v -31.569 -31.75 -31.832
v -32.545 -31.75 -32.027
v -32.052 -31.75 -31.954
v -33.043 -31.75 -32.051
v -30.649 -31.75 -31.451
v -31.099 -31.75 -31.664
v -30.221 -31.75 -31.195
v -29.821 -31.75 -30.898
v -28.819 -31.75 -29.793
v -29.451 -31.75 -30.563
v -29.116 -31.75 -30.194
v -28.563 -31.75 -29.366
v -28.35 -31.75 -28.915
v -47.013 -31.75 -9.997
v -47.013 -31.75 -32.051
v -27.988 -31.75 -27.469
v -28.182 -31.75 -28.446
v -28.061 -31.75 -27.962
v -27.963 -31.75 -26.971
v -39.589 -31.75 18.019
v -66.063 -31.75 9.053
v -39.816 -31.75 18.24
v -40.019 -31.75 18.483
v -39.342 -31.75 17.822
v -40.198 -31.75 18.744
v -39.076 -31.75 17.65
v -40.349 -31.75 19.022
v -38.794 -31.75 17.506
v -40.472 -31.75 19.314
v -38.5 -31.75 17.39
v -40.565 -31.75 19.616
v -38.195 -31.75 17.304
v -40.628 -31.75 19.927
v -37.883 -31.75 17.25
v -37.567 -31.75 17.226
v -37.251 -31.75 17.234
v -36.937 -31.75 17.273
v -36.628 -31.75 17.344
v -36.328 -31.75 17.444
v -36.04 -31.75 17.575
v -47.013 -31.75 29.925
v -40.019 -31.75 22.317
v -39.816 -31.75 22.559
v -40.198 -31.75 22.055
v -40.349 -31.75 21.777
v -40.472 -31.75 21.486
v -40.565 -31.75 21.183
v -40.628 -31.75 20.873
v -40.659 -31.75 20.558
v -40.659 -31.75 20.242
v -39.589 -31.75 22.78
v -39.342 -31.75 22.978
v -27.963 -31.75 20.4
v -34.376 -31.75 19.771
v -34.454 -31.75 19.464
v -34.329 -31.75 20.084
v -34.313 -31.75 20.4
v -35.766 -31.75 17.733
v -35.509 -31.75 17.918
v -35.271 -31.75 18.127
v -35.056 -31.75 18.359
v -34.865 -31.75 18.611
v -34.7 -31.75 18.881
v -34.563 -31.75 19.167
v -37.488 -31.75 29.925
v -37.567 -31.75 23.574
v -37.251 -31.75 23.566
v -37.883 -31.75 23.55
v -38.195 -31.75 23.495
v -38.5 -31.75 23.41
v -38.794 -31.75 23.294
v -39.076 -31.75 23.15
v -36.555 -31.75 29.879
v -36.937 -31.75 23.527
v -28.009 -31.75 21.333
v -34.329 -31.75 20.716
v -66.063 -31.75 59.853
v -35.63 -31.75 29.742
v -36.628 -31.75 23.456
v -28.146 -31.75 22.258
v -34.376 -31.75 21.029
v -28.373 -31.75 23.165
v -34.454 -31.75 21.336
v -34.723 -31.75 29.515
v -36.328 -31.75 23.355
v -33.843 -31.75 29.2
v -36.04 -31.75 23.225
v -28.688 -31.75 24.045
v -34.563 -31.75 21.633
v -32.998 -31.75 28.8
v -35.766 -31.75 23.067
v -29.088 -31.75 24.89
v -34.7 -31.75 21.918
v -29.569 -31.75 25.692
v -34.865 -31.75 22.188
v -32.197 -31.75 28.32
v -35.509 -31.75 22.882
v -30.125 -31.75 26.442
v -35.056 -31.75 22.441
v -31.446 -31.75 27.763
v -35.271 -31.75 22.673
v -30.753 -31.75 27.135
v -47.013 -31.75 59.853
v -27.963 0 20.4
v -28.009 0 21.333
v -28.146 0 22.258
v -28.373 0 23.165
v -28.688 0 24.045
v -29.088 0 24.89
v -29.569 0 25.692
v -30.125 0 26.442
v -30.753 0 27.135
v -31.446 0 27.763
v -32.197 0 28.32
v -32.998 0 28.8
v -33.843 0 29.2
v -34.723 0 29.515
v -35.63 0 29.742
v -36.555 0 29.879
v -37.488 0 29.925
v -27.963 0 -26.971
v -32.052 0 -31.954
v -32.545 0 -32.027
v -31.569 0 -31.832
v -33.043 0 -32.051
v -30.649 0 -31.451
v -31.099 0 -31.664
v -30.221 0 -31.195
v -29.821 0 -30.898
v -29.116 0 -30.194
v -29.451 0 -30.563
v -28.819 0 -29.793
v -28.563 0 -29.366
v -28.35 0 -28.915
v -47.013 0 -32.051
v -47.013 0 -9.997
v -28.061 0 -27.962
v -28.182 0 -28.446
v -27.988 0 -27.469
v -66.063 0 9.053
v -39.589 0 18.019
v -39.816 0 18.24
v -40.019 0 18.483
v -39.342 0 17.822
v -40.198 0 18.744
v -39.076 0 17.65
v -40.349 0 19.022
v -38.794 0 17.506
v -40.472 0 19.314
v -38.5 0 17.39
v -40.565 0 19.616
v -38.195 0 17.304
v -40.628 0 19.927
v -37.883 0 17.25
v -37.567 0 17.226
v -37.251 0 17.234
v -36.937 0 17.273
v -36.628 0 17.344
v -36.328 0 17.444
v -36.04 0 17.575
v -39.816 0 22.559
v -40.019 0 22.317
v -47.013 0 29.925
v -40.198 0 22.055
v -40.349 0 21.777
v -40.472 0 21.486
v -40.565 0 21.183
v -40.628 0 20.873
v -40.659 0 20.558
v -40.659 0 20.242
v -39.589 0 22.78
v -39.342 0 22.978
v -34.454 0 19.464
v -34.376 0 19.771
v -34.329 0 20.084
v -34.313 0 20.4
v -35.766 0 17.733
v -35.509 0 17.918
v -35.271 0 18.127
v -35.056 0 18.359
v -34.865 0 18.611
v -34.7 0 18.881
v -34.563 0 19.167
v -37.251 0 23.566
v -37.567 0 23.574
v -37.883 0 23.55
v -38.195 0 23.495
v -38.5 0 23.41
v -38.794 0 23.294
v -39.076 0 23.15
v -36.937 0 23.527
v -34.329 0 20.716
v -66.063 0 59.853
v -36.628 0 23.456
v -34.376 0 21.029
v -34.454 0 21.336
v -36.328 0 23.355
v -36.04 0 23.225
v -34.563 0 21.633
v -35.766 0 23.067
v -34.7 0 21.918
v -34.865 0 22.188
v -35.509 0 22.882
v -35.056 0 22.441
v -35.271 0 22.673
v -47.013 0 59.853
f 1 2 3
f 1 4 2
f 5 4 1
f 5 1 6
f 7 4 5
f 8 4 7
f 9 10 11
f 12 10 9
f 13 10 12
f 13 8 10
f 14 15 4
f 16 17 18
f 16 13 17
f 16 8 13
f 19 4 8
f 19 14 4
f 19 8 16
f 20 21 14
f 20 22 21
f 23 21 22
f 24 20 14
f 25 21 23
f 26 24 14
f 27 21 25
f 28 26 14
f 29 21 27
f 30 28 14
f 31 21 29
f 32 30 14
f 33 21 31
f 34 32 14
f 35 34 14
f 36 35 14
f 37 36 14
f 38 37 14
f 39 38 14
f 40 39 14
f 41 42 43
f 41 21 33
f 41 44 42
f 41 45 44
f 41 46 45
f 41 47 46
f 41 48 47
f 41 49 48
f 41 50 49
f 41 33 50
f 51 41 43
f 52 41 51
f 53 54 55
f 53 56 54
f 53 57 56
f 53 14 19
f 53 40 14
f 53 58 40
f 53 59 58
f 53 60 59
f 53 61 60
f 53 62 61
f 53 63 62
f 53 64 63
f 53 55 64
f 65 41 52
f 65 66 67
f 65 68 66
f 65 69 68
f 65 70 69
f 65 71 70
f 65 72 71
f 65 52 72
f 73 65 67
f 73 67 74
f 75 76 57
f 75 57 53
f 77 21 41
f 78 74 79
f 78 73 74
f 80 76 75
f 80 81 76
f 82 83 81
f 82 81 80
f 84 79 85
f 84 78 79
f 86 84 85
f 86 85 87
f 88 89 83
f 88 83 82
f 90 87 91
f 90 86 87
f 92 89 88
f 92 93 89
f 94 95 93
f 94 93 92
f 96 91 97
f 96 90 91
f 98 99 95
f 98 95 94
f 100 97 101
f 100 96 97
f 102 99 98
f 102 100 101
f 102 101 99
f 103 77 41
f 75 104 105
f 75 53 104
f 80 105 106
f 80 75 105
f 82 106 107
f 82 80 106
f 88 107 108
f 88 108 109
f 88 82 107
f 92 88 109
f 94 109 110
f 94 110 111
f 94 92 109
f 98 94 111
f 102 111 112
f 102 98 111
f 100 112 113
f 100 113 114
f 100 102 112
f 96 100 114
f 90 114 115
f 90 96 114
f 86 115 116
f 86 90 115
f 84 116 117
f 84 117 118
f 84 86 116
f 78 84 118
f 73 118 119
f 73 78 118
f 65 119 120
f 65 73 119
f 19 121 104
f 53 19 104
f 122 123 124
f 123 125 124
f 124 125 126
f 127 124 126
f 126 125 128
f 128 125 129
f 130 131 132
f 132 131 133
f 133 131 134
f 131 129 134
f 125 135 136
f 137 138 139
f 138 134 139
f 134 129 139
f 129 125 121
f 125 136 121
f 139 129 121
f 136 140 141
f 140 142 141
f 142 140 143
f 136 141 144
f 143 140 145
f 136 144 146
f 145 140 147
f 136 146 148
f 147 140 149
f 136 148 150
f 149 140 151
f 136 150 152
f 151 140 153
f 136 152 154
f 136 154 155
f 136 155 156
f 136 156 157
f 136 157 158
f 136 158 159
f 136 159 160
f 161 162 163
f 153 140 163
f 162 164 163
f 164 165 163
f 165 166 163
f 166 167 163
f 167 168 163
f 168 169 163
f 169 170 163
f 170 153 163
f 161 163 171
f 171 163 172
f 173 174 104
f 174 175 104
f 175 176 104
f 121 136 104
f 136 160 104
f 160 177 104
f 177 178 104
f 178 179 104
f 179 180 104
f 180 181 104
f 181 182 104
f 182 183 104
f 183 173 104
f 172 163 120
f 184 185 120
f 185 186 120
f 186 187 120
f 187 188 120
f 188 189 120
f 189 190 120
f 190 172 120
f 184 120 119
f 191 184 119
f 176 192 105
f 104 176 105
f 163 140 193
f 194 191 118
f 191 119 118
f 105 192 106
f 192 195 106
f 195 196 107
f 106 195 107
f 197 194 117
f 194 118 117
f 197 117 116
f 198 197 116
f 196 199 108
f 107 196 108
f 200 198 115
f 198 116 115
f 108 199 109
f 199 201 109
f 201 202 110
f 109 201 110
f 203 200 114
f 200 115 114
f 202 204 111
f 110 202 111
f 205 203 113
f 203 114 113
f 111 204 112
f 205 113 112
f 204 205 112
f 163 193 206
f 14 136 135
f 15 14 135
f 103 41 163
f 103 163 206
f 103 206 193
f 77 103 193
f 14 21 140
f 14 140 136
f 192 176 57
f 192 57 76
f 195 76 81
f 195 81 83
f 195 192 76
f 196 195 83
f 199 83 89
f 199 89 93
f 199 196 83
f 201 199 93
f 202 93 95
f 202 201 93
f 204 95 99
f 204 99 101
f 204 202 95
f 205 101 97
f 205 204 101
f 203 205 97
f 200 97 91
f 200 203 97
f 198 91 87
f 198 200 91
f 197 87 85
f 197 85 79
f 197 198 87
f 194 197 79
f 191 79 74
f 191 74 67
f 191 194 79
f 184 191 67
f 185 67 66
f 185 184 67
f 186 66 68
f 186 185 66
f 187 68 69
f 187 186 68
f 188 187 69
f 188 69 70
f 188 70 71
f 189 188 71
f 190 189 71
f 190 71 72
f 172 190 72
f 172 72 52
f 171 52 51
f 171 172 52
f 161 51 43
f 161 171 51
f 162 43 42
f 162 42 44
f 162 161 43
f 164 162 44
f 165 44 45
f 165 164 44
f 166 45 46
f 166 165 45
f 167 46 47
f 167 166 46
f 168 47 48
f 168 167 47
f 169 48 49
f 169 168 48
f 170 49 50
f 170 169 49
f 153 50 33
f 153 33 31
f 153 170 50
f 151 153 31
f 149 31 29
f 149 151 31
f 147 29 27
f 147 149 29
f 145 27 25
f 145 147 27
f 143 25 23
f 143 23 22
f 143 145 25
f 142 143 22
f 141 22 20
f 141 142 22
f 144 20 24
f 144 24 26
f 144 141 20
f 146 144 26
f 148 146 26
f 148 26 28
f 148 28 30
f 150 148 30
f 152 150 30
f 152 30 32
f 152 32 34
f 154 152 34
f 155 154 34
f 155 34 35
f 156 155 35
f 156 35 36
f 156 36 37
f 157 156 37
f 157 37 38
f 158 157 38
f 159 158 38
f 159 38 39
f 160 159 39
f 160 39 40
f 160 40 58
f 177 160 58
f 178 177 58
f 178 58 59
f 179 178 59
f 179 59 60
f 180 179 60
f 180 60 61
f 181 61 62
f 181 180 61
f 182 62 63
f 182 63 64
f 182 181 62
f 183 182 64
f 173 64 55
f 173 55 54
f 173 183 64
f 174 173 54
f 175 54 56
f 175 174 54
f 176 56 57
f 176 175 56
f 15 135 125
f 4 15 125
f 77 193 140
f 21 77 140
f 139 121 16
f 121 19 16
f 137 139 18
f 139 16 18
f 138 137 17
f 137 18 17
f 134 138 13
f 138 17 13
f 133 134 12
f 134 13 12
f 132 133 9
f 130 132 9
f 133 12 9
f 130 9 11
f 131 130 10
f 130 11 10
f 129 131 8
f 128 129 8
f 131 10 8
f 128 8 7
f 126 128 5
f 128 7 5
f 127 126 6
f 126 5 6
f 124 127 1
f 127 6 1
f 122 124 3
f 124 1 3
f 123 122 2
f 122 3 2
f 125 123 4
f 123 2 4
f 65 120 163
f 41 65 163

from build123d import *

# Parameters (mm, degrees)
F0_R     = 3.175
F1_DEPTH = 31.75
F2_R     = 5.08
F3_R     = 9.525


with BuildPart() as f1:
    # F0 (on Front) → F1 (new body)
    with BuildSketch(Plane.XZ):
        Polygon((-27.963307, 29.924871), (-47.013307, 29.924871), (-47.013307, 59.853119), (-66.063307, 59.853119), (-66.063307, 9.053119), (-47.013307, -9.996881), (-47.013307, -32.051129), (-27.963307, -32.051129), align=None)
        with Locations((-37.488307, 20.399871)):
            Circle(F0_R, mode=Mode.SUBTRACT)
    extrude(amount=F1_DEPTH)

    # F2
    f2_edges = [f1.edges().sort_by_distance(p)[0] for p in [
        (-27.963307, -15.875, -32.051129),
    ]]
    fillet(f2_edges, radius=F2_R)

    # F3
    f3_edges = [f1.edges().sort_by_distance(p)[0] for p in [
        (-27.963307, -15.875, 29.924871),
    ]]
    fillet(f3_edges, radius=F3_R)


solid = f1.part
